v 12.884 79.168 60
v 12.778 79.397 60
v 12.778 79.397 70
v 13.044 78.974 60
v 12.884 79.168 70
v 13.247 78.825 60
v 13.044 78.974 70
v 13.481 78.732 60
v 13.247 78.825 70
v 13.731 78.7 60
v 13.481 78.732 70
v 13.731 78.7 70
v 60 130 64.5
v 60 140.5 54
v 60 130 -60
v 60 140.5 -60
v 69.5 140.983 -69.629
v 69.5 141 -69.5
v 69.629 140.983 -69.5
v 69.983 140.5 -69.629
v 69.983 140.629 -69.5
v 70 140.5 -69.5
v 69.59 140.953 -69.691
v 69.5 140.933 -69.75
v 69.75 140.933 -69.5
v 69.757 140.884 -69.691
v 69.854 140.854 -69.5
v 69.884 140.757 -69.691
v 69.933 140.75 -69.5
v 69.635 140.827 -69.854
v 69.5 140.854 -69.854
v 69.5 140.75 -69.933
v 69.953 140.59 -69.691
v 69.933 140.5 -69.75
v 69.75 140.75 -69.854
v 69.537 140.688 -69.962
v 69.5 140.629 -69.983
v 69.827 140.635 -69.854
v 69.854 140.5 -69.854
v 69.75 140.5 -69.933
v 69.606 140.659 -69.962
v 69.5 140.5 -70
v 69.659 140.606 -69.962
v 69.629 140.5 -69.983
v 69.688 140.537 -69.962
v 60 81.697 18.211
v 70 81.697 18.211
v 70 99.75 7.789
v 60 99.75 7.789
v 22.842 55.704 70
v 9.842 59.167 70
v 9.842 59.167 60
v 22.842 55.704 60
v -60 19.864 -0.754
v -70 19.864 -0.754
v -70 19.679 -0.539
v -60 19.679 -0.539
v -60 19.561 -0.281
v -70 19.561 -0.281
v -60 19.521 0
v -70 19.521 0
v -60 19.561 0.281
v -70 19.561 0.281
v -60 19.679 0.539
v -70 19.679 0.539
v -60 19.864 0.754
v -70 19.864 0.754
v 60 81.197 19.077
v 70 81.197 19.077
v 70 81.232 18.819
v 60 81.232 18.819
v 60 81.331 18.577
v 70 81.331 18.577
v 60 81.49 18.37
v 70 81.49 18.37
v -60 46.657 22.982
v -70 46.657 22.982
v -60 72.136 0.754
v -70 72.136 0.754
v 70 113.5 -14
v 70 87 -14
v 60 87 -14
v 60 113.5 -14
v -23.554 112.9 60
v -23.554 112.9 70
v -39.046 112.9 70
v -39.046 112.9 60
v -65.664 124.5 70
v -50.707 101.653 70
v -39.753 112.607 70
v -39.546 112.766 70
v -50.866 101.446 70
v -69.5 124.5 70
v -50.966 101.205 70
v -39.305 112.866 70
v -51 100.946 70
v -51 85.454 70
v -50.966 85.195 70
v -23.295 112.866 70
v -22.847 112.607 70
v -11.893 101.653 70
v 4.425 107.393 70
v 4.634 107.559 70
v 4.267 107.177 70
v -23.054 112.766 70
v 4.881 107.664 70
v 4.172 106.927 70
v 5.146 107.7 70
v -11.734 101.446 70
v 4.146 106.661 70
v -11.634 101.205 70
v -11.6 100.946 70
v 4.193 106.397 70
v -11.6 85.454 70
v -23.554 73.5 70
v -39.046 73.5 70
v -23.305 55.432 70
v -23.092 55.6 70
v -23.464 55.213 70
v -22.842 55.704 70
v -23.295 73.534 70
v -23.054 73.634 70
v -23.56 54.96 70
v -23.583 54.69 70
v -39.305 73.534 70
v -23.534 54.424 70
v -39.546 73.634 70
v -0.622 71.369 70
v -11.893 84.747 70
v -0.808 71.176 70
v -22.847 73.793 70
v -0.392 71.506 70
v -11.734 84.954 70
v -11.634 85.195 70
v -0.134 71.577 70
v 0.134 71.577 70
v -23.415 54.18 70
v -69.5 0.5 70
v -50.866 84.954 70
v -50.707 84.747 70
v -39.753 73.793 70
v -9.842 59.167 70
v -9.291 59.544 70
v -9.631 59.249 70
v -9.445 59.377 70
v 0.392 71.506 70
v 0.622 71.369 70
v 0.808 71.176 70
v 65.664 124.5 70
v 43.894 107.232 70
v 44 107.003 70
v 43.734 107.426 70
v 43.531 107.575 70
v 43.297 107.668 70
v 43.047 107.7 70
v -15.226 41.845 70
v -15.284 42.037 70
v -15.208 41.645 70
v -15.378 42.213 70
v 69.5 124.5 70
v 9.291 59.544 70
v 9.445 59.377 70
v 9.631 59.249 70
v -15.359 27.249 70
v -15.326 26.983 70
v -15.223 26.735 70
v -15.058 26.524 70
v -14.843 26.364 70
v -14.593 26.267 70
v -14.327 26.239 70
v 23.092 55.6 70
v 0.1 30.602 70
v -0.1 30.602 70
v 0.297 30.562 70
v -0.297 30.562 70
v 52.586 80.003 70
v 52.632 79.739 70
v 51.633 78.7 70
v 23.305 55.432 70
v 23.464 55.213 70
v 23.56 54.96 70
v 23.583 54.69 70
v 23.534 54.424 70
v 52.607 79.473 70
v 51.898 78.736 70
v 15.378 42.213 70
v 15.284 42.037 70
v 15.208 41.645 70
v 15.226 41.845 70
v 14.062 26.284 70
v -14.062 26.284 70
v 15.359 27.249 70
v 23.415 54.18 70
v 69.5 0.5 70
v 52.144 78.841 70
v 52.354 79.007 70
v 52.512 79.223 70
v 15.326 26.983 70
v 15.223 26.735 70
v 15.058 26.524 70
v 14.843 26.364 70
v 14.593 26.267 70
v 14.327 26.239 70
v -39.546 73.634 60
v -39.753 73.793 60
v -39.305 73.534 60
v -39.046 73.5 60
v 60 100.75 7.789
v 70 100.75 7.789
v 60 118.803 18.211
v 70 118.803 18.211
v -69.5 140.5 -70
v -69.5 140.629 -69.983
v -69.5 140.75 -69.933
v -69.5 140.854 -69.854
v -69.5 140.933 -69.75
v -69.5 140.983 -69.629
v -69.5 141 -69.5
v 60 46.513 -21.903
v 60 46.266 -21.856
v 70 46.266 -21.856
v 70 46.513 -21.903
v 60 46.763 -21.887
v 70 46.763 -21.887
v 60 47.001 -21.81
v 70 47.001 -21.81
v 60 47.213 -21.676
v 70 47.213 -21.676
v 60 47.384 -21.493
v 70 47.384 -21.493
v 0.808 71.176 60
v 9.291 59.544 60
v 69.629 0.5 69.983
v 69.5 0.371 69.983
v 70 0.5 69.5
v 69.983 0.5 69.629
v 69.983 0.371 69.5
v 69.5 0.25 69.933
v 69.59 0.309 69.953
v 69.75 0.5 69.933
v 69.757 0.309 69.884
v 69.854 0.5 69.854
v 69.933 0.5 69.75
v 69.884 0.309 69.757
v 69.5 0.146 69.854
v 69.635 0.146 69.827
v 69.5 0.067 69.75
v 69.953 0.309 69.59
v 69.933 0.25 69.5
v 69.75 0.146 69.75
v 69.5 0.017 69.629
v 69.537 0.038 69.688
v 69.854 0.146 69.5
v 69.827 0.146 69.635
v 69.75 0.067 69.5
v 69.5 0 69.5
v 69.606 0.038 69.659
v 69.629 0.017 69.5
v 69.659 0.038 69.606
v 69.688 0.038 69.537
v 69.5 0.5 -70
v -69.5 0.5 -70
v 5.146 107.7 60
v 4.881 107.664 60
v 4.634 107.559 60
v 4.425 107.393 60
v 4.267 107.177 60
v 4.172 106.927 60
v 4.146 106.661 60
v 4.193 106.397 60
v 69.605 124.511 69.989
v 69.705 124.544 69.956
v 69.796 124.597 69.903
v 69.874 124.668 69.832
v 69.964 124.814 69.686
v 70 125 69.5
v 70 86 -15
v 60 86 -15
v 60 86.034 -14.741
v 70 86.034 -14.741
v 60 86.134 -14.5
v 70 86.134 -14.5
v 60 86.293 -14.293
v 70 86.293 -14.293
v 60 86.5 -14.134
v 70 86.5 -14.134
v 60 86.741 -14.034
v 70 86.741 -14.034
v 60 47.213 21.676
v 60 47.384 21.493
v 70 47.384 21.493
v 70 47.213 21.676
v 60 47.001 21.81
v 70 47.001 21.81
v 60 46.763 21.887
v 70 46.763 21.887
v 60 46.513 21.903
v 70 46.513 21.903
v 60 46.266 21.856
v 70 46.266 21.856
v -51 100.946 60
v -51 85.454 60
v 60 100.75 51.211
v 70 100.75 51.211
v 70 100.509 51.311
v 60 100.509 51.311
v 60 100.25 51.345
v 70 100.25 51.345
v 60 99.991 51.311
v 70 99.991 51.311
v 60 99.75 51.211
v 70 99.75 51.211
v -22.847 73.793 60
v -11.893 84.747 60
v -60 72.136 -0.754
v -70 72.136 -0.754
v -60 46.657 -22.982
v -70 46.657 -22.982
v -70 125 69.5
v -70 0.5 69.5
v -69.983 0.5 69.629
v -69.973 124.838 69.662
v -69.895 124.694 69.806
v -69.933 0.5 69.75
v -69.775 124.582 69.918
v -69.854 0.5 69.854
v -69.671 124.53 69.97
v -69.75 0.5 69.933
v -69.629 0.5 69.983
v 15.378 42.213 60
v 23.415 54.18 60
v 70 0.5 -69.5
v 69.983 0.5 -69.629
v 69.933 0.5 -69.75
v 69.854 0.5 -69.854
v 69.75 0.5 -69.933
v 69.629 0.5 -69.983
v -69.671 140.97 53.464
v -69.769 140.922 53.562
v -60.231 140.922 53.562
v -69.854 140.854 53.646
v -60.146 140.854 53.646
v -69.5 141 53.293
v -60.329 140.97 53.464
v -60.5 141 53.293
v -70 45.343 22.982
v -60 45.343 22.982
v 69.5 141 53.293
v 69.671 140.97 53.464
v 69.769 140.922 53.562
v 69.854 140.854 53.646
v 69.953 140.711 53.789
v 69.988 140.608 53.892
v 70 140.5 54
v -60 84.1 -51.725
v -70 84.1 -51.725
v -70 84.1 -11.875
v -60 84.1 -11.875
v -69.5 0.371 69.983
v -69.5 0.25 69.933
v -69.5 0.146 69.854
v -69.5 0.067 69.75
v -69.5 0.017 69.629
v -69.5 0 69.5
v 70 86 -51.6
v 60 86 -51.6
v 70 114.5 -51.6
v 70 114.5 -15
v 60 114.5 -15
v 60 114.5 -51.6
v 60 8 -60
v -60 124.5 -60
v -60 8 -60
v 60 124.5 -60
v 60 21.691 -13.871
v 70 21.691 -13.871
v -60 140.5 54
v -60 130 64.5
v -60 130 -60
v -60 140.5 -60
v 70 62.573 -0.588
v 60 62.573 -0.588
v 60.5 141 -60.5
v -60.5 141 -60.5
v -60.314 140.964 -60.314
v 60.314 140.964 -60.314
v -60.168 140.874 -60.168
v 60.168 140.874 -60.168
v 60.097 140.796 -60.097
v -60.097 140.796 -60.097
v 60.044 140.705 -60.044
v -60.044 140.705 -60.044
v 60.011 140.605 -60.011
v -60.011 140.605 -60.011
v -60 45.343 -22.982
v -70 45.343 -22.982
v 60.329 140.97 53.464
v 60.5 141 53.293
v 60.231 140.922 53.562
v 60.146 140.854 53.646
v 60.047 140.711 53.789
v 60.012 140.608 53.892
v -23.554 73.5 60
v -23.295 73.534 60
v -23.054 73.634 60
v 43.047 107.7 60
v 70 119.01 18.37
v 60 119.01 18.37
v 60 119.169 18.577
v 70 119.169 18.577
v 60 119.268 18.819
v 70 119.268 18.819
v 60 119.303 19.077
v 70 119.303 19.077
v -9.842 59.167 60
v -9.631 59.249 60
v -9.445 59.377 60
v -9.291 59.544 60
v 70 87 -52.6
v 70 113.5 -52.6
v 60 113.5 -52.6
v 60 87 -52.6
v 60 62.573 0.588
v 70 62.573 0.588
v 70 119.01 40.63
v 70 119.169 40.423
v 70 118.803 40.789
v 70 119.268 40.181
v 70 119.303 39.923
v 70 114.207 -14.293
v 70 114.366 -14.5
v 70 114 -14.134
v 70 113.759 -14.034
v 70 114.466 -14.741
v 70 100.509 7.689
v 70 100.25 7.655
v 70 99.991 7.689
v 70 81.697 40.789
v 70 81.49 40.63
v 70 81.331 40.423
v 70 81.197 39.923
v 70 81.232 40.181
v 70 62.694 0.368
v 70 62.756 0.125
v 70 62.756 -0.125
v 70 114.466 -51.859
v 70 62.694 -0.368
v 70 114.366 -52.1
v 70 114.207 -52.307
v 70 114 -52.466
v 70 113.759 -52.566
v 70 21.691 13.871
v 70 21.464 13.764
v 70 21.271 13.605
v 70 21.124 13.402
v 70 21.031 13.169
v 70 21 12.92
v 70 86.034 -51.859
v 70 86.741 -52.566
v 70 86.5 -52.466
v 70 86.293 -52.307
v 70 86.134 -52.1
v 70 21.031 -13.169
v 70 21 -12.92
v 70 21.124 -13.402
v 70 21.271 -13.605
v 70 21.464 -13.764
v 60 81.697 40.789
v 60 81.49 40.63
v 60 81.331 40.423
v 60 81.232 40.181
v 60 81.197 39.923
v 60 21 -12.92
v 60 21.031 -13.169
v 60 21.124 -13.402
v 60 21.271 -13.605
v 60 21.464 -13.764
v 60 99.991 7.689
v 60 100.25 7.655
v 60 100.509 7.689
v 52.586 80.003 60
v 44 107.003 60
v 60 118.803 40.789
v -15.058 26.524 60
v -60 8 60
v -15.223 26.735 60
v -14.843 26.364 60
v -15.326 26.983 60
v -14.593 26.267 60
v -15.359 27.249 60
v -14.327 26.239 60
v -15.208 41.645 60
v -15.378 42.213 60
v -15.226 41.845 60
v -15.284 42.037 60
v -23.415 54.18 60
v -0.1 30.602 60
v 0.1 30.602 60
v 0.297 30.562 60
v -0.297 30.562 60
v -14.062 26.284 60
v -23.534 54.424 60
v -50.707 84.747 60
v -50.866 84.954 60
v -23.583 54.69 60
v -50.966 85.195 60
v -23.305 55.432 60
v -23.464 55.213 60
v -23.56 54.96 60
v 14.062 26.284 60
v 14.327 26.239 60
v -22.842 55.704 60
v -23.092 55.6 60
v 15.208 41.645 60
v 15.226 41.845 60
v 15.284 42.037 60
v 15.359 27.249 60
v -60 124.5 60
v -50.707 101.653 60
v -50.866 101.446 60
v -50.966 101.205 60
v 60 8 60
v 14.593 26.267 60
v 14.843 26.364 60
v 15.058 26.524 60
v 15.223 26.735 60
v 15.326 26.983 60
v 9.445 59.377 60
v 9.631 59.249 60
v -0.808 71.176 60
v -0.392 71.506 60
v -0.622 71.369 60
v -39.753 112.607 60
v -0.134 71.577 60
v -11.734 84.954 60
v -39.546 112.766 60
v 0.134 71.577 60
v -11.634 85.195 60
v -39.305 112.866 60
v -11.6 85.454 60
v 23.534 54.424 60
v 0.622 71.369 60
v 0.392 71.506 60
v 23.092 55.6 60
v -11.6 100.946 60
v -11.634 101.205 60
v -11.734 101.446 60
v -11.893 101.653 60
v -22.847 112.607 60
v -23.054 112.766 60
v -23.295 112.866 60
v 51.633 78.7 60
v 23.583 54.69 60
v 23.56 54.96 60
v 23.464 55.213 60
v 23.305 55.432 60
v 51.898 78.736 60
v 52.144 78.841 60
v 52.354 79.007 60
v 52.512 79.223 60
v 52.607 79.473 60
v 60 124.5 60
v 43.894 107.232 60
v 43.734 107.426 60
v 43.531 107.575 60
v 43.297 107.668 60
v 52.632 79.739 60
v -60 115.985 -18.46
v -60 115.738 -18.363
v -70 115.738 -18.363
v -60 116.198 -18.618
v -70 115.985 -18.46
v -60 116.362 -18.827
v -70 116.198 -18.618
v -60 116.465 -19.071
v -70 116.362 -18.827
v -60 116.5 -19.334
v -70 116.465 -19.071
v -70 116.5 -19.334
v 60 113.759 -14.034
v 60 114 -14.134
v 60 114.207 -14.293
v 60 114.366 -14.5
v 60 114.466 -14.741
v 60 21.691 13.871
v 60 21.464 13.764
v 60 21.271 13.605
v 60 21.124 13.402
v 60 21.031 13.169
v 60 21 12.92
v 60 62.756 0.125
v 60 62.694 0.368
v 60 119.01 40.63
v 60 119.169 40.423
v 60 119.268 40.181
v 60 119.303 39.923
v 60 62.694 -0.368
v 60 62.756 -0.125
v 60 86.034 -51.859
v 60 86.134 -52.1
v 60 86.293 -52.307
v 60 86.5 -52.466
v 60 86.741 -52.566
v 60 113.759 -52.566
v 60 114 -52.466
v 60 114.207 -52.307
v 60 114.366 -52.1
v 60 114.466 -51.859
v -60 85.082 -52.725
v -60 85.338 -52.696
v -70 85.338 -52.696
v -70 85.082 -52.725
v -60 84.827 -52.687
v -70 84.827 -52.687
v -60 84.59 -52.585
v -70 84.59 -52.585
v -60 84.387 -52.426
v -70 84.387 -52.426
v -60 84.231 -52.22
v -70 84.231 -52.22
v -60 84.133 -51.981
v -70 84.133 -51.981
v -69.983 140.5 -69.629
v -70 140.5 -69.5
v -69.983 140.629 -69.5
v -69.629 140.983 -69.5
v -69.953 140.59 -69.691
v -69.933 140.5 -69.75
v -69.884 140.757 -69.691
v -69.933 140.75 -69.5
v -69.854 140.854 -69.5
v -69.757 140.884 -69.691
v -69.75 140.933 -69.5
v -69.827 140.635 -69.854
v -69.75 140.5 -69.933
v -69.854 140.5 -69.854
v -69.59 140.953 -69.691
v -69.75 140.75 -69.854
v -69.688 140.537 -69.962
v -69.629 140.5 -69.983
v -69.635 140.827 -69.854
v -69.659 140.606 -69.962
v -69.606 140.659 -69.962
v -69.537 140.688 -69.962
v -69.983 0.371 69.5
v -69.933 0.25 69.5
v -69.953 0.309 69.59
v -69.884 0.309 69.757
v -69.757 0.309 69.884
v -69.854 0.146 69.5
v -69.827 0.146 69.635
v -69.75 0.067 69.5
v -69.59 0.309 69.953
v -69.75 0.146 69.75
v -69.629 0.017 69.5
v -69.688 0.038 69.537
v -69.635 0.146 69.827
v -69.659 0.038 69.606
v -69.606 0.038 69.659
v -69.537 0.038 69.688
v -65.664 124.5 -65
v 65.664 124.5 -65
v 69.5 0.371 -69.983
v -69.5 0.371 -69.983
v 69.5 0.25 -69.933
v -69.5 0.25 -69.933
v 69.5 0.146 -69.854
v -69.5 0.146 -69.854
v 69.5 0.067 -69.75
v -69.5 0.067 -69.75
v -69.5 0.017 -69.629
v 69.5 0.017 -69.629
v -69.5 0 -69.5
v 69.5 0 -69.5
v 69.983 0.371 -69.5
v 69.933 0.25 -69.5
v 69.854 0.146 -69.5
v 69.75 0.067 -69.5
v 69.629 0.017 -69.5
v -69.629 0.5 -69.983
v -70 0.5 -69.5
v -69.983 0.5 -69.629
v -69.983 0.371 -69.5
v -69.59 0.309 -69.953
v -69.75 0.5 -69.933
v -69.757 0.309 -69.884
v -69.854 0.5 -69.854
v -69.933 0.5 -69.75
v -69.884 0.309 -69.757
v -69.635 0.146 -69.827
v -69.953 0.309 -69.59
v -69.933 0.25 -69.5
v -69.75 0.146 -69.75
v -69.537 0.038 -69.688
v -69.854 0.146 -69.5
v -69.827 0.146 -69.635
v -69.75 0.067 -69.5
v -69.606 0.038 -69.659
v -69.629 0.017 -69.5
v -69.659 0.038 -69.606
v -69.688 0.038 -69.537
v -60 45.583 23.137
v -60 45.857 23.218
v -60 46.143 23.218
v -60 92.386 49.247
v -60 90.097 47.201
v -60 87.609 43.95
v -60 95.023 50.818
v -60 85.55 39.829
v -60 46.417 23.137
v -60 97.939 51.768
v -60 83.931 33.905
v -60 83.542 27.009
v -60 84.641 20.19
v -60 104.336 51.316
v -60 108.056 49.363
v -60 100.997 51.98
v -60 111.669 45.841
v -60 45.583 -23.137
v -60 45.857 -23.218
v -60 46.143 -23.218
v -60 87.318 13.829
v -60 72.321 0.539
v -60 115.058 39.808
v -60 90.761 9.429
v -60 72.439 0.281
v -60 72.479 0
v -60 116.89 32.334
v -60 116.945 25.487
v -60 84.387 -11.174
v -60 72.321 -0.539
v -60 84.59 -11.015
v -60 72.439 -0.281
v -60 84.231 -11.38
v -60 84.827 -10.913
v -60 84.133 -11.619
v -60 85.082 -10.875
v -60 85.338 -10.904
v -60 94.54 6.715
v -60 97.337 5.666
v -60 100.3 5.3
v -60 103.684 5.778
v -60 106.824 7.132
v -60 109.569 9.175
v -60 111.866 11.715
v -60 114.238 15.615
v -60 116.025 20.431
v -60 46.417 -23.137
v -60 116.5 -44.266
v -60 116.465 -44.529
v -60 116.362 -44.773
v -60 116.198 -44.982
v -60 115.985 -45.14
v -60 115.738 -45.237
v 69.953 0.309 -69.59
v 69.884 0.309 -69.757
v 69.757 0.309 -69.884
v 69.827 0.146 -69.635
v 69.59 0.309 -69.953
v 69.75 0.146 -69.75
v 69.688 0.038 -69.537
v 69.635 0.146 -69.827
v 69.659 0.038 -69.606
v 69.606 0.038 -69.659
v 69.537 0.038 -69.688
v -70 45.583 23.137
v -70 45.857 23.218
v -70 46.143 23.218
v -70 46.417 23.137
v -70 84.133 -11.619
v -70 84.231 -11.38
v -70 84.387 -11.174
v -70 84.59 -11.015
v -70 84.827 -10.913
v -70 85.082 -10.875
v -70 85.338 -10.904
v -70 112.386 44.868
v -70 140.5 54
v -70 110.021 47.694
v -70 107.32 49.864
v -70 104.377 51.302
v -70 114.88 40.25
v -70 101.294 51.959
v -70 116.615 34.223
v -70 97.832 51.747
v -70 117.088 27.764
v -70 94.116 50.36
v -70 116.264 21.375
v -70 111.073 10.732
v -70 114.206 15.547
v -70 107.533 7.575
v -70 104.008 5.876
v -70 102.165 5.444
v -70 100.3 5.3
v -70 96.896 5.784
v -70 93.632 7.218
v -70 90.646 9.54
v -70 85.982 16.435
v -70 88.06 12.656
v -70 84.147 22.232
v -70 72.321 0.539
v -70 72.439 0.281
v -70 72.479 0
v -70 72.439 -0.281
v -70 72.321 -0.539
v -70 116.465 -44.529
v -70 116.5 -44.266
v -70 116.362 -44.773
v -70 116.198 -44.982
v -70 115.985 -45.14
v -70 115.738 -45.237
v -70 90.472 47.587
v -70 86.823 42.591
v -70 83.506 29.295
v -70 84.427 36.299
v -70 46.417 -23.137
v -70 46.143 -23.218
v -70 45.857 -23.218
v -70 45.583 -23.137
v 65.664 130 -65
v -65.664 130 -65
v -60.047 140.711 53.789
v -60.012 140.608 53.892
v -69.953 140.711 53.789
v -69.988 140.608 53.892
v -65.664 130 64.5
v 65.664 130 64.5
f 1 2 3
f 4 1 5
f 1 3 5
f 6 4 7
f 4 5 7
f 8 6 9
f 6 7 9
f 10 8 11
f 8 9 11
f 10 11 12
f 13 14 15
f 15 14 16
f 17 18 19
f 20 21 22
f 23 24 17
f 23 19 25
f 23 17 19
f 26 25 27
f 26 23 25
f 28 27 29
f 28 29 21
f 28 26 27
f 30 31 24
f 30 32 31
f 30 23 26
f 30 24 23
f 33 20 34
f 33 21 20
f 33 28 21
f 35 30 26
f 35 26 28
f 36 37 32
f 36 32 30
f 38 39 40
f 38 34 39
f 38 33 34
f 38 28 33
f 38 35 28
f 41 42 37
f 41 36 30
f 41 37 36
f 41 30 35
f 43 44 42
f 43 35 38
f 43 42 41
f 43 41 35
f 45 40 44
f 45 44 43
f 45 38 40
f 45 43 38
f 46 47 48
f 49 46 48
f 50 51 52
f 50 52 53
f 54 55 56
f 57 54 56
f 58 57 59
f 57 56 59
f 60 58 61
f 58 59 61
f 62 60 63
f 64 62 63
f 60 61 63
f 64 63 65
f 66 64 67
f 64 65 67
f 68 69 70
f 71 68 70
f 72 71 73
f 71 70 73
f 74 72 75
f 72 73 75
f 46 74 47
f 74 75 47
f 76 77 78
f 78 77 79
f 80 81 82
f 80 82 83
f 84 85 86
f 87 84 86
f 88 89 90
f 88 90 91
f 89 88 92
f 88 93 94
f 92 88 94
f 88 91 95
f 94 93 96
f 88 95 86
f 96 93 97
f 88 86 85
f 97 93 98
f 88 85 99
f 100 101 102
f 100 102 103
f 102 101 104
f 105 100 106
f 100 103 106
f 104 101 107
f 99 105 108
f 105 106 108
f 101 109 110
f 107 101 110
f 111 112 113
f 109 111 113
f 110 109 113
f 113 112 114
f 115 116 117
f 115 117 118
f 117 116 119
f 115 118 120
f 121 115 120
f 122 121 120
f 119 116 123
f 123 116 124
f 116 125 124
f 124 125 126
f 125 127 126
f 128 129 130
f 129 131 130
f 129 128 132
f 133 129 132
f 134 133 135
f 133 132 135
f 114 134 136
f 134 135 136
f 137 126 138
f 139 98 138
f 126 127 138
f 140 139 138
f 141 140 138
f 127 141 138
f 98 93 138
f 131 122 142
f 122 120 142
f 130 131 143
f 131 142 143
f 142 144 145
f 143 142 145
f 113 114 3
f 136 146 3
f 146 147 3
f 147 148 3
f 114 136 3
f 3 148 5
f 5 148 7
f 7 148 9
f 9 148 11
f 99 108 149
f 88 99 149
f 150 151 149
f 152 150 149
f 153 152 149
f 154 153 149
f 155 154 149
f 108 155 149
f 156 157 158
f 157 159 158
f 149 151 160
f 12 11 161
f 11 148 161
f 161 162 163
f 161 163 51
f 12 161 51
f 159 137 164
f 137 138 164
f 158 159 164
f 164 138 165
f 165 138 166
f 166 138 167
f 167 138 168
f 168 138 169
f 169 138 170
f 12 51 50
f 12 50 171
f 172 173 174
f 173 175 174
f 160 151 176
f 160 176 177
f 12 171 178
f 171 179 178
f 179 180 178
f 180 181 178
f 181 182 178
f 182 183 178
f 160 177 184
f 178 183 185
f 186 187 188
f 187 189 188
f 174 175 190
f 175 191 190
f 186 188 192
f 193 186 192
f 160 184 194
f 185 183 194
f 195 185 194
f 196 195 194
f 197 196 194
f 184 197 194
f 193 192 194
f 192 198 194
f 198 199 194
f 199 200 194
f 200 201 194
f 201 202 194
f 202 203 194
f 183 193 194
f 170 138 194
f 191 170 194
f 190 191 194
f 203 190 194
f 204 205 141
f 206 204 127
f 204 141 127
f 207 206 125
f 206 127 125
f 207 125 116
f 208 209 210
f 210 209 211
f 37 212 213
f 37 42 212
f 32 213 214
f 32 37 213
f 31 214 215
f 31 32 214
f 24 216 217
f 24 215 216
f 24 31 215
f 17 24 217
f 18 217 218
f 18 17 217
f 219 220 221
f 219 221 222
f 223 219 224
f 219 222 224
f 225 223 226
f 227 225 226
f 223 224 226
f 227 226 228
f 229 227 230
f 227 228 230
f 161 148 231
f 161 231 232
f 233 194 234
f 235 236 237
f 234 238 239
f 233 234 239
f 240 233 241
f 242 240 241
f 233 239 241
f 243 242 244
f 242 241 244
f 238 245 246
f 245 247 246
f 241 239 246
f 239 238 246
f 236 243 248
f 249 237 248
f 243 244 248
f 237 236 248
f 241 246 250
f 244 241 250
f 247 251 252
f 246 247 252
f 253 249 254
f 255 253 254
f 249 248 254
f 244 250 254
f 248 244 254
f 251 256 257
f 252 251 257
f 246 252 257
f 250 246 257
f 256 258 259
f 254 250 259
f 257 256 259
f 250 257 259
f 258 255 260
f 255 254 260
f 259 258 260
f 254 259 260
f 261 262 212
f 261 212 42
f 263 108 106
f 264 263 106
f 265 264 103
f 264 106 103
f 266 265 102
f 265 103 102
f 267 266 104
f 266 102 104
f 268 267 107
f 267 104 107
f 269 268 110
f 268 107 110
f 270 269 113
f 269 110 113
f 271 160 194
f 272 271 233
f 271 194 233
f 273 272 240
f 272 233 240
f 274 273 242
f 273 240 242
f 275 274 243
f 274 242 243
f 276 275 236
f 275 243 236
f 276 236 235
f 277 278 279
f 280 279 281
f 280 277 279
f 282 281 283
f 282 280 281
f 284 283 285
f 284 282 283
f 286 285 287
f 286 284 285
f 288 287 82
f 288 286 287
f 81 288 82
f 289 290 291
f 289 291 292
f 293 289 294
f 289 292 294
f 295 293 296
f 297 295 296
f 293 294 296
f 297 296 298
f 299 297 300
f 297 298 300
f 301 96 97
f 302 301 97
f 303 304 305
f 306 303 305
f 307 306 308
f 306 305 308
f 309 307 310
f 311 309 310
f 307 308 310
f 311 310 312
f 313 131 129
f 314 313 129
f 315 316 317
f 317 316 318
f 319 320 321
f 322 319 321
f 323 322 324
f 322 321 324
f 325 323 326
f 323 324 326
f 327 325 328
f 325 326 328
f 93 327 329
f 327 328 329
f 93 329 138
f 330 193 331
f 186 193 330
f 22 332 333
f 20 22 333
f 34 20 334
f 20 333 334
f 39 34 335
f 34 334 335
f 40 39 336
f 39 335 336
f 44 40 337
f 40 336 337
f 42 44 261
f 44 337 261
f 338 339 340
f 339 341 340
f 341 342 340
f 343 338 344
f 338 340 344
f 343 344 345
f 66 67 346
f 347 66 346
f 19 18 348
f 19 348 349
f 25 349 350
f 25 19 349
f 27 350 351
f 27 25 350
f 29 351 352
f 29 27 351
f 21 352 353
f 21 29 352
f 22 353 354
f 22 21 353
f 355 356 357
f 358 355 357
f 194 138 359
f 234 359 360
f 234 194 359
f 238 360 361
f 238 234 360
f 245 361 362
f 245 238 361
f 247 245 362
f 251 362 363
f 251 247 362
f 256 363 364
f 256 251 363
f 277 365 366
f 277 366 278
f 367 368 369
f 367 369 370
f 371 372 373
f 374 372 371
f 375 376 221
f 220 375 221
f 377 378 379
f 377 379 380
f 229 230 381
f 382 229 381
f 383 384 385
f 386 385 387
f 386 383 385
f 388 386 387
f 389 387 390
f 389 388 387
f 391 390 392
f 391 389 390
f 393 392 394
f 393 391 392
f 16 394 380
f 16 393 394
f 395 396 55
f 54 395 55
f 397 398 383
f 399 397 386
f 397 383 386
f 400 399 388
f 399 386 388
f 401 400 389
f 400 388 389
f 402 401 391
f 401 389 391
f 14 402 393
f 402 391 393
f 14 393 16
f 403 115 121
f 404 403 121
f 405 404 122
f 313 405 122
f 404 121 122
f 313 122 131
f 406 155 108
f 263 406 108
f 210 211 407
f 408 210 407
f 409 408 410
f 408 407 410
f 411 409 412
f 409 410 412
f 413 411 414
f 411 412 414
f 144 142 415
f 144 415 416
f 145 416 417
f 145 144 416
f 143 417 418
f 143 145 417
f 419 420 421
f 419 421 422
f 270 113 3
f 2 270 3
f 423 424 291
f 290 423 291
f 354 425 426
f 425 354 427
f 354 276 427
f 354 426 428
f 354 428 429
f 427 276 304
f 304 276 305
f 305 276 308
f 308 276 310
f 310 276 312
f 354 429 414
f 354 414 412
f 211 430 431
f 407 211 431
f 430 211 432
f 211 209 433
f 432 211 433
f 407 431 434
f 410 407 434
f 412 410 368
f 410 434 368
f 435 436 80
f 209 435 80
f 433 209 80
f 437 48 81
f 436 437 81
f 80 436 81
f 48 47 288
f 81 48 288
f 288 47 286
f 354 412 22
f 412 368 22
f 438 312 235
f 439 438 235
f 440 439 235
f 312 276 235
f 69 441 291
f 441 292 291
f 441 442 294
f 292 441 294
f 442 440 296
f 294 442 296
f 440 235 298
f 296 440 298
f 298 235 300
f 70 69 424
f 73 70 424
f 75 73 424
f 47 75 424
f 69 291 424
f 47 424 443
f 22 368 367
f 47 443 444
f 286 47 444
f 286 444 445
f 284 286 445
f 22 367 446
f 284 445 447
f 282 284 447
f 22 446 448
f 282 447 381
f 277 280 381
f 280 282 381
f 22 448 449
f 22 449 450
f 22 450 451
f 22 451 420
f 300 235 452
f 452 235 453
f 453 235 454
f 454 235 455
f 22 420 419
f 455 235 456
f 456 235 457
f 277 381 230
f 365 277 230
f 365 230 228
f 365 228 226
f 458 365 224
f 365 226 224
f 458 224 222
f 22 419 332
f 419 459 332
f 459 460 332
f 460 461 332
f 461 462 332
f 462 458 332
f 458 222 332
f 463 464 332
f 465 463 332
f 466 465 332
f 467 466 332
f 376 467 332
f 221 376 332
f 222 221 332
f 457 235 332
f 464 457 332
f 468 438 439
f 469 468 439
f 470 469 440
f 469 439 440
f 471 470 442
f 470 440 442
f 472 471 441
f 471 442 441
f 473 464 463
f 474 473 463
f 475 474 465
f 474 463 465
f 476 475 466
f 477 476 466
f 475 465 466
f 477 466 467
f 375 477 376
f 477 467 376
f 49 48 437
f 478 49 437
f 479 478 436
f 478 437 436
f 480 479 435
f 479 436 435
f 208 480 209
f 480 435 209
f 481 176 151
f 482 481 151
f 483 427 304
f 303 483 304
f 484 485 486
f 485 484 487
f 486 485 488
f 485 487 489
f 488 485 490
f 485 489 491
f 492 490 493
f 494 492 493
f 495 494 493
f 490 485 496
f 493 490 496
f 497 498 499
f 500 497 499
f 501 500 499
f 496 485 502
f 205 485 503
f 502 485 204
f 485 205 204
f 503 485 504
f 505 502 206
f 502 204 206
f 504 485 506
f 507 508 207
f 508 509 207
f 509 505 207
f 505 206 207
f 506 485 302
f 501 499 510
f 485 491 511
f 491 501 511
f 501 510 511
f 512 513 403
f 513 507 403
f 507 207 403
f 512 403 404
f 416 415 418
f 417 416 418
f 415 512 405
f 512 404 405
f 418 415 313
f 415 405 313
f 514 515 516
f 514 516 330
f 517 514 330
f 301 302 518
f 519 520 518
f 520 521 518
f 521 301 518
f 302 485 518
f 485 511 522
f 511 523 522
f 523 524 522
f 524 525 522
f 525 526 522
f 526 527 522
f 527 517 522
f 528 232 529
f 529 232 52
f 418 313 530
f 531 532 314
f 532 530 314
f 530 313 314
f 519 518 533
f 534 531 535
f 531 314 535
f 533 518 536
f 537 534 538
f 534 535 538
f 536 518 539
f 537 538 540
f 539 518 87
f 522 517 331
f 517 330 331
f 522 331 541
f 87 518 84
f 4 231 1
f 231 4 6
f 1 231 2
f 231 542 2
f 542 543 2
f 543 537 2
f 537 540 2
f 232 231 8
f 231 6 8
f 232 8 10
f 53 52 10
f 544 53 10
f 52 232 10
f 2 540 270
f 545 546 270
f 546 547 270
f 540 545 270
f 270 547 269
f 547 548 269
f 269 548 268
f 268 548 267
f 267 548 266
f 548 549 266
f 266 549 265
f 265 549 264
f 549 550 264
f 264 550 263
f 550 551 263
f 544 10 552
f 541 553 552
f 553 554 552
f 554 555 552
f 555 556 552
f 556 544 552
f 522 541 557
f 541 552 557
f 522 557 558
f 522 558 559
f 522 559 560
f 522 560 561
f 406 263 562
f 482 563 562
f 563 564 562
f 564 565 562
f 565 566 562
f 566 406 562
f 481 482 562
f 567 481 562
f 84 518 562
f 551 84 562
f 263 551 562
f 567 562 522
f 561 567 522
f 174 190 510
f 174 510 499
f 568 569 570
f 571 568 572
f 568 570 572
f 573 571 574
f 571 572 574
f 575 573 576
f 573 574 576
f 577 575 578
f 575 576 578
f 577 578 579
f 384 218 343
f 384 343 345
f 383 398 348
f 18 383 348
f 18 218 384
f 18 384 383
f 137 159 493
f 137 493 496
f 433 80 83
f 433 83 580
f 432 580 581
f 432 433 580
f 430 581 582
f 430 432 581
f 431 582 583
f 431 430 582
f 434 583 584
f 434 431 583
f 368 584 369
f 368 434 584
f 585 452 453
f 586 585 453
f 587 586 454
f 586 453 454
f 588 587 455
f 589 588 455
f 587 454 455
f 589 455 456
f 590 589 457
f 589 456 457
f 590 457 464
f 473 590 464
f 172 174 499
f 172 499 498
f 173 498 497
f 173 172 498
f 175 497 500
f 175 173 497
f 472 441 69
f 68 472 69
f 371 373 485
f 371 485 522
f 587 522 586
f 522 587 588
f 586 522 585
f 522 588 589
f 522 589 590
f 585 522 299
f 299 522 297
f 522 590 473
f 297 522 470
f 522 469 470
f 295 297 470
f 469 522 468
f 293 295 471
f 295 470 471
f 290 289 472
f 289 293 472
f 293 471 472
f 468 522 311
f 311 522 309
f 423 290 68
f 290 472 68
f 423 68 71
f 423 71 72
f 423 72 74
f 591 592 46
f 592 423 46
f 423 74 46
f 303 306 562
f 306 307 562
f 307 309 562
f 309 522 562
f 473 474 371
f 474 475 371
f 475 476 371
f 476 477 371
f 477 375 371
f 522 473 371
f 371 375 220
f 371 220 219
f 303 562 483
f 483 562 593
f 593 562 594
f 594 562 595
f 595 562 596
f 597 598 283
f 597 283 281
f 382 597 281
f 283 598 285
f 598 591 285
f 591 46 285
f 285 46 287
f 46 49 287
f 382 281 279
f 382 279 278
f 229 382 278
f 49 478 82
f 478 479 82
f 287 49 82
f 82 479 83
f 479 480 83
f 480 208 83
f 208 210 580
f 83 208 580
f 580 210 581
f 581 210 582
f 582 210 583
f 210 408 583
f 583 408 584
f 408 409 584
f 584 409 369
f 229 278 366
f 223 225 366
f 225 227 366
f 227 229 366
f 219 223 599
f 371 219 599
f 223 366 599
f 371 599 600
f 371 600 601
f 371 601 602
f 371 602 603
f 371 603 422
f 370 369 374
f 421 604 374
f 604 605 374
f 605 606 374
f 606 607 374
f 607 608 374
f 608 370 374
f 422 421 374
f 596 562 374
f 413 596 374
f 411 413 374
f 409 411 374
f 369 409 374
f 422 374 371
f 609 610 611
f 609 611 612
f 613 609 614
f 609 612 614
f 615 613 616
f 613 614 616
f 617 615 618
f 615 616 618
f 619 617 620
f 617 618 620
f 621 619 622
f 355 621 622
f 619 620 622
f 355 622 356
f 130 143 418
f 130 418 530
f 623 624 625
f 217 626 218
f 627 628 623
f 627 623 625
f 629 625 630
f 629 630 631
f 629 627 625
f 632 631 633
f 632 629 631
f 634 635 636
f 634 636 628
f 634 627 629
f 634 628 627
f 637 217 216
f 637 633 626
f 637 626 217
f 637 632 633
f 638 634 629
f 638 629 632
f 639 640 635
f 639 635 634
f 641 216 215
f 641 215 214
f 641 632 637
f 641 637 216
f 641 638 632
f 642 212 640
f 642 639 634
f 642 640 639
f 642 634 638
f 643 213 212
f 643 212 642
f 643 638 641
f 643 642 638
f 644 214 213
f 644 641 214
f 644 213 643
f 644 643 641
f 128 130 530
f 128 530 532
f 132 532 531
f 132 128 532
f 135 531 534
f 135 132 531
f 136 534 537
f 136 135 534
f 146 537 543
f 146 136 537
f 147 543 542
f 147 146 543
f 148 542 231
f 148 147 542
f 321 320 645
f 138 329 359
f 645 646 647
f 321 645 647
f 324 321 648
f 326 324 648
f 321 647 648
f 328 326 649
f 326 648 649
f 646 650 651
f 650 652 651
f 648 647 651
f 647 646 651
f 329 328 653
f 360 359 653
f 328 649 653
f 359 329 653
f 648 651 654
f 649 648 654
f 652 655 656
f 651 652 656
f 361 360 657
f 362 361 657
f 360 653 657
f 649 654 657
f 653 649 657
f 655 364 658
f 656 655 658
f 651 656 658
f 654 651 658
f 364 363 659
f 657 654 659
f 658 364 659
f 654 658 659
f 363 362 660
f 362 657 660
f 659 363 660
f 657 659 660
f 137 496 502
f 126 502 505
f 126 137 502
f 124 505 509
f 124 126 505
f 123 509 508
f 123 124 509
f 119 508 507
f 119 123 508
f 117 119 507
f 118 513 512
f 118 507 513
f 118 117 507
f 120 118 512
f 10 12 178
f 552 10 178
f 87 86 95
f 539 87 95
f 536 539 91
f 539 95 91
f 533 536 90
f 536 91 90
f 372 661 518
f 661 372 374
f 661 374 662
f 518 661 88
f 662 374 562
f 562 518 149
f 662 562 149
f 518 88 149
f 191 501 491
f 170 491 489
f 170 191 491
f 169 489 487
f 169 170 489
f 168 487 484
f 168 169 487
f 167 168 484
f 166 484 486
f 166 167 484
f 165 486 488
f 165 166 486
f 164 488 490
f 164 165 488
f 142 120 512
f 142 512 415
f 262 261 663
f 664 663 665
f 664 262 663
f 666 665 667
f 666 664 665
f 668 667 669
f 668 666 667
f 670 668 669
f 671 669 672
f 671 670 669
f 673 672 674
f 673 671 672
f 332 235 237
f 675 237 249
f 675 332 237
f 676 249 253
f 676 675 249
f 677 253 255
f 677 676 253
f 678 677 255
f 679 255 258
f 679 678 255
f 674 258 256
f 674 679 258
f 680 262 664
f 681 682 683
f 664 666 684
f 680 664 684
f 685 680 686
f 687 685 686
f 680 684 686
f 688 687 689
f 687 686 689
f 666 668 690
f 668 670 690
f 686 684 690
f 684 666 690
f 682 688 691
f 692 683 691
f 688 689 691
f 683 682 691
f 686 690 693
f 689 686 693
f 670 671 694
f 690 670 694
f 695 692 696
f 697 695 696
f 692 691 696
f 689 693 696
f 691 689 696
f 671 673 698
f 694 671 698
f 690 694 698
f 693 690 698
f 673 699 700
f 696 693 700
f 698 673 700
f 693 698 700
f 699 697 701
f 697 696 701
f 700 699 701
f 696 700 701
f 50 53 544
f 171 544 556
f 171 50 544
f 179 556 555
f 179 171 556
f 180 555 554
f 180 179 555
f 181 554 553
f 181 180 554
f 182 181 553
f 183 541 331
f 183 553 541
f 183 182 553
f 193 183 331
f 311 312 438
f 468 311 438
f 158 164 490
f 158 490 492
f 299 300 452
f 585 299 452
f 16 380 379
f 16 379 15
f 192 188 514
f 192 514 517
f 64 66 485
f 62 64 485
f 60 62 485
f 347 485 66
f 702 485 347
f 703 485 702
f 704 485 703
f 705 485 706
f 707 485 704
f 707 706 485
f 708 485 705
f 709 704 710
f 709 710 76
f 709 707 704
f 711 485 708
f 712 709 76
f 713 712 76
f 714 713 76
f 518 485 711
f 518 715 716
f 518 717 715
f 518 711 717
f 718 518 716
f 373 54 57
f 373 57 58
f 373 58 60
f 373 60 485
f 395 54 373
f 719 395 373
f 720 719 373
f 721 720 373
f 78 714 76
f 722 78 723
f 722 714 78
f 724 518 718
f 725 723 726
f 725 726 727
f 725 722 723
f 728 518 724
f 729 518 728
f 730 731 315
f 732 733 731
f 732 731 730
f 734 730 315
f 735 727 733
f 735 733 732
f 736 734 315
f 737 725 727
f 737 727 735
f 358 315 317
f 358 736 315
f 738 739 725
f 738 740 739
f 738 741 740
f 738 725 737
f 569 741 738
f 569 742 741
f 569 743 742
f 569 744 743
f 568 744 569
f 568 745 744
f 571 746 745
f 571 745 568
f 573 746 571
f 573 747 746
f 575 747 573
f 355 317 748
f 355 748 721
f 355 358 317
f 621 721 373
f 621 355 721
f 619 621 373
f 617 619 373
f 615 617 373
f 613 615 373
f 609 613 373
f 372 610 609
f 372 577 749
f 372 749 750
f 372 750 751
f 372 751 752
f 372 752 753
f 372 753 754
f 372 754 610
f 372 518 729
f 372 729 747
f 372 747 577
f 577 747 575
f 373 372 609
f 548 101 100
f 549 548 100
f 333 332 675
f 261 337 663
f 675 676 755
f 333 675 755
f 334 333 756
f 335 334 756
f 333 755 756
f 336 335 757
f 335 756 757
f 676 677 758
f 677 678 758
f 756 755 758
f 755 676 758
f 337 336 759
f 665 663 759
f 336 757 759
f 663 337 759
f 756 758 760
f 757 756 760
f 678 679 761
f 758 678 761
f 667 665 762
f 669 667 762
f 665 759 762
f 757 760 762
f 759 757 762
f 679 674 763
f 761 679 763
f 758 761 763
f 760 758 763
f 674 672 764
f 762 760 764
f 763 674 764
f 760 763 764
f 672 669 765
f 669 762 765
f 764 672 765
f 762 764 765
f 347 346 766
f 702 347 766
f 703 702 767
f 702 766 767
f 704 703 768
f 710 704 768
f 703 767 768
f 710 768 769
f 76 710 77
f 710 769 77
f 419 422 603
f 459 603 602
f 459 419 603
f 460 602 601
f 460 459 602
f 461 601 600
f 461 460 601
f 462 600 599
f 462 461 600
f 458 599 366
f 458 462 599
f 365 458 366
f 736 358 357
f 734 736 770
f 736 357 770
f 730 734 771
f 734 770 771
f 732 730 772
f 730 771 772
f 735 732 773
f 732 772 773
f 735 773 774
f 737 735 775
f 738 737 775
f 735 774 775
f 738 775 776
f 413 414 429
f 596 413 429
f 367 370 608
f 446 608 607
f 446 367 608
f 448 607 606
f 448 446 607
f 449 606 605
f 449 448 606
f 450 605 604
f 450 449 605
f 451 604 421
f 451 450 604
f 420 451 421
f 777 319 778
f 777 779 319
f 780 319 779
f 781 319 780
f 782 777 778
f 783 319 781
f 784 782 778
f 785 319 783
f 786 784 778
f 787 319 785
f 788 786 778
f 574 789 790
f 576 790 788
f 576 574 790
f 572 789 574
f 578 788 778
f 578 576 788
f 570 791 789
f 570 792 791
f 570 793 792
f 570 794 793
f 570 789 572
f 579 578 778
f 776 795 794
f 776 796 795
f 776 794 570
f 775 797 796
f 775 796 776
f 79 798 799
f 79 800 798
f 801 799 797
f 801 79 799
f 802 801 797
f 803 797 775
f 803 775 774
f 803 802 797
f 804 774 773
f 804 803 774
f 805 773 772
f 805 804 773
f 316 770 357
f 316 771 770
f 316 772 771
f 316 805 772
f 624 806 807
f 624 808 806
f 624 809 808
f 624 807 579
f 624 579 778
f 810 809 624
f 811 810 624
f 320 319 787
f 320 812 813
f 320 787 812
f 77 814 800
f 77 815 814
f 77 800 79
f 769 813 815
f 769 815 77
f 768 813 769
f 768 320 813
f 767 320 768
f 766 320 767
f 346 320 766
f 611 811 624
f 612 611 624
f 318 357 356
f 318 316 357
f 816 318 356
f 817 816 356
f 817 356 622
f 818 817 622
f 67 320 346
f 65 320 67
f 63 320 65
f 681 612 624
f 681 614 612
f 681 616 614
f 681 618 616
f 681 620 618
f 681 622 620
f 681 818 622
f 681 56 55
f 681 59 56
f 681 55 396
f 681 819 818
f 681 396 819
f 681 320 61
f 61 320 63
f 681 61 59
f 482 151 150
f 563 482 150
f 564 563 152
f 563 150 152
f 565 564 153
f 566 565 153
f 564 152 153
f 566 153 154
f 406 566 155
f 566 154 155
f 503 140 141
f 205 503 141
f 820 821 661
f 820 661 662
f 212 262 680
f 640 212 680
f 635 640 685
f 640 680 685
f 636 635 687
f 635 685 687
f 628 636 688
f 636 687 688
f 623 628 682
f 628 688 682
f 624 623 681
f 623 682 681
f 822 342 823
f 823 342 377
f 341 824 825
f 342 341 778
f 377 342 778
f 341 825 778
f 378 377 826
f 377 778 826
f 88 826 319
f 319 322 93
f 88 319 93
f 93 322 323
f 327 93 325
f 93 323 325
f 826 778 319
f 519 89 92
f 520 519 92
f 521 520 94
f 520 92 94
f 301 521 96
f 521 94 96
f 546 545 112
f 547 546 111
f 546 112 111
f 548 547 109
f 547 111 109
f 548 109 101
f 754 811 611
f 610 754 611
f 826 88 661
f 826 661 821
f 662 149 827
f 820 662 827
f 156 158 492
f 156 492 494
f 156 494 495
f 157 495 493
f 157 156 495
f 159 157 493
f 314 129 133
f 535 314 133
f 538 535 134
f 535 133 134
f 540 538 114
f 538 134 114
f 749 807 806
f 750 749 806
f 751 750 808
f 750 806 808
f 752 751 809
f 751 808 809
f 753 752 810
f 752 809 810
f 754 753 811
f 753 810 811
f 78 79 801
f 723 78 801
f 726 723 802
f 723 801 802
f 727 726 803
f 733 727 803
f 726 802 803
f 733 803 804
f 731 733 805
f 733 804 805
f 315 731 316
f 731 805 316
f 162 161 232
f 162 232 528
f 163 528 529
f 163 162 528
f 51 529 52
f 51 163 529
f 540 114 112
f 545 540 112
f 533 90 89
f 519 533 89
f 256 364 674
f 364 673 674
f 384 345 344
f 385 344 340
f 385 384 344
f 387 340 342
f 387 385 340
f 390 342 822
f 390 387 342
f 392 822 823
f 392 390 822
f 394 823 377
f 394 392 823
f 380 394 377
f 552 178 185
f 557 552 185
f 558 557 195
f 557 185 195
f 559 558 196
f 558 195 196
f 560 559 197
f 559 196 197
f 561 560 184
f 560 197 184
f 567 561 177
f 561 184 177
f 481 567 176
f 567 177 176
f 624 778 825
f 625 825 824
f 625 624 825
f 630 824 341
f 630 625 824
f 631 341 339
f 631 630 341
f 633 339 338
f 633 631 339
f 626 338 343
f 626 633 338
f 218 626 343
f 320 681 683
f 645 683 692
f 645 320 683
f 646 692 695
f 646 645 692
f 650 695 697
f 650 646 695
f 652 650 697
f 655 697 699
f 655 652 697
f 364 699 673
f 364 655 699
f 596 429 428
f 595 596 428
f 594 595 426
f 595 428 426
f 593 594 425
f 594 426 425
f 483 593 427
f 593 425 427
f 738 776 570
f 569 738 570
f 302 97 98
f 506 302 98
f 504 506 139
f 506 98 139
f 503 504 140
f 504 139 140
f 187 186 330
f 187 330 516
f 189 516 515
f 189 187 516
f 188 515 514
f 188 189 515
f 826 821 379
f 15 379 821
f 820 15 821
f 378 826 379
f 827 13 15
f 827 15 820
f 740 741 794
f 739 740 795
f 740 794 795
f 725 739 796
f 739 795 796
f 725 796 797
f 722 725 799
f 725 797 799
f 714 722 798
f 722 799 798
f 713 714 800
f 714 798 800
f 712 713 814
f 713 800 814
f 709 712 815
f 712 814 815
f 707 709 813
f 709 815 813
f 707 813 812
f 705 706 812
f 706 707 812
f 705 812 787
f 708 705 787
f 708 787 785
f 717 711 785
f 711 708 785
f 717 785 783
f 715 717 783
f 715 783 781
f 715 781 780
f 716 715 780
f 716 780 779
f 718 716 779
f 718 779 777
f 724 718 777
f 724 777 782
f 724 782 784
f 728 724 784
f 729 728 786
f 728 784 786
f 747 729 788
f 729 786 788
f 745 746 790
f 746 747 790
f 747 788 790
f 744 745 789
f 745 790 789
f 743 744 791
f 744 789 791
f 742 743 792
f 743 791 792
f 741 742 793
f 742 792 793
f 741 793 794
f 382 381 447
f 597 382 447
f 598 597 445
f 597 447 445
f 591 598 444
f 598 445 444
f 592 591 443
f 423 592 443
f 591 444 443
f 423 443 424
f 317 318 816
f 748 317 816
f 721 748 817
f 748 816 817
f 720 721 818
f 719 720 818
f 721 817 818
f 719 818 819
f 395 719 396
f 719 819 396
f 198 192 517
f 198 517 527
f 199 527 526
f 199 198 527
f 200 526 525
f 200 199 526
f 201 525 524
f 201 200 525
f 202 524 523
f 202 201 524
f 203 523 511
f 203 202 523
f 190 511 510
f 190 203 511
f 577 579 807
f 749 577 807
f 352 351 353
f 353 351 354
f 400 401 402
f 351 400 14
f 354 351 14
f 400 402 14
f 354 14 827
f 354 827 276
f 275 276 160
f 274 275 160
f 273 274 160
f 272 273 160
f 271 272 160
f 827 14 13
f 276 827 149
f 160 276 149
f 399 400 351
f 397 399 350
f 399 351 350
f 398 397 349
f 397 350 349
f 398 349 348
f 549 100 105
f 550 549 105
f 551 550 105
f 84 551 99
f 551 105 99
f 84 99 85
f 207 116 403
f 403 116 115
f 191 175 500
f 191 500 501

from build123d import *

# Parameters (mm, degrees)
SKETCH2_W           = 140
SKETCH2_H           = 140
BOSS_EXTRUDE1_DEPTH = 141
SKETCH3_W           = 120
SKETCH3_H           = 120
CUT_EXTRUDE1_DEPTH  = 133
SKETCH4_W           = 131.328549568
SKETCH4_H           = 5.5
CUT_EXTRUDE2_DEPTH  = 135
CUT_EXTRUDE3_DEPTH  = 211.667985228
CUT_EXTRUDE4_REACH  = 212.668
CUT_EXTRUDE5_REACH  = 212.668
SKETCH7_RX          = 23.35
SKETCH7_RY          = 16.8
CUT_EXTRUDE6_REACH  = 212.668
FILLET2_R           = 0.5
FILLET6_R           = 0.5
SKETCH10_W          = 120
SKETCH10_H          = 10.5
CUT_EXTRUDE7_DEPTH  = 131
FILLET7_R           = 0.5


with BuildPart() as part:
    # Sketch2 → Boss-Extrude1 (new body)
    with BuildSketch(Plane(origin=(0, 0, 0), x_dir=(1, 0, 0), z_dir=(0, 1, 0))):
        Rectangle(SKETCH2_W, SKETCH2_H)
    extrude(amount=BOSS_EXTRUDE1_DEPTH)

    # Sketch3 → Cut-Extrude1 (cut)
    with BuildSketch(Plane(origin=(0, 141, 0), x_dir=(1, 0, 0), z_dir=(0, 1, 0))):
        Rectangle(SKETCH3_W, SKETCH3_H)
    extrude(amount=-CUT_EXTRUDE1_DEPTH, mode=Mode.SUBTRACT)

    # Sketch4 → Cut-Extrude2 (cut)
    with BuildSketch(Plane.XY.offset(70)):
        with Locations((0, 127.25)):
            Rectangle(SKETCH4_W, SKETCH4_H)
    extrude(amount=-CUT_EXTRUDE2_DEPTH, mode=Mode.SUBTRACT)

    # Sketch5 → Cut-Extrude3 (cut, through all)
    with BuildSketch(Plane.ZY.offset(70)):
        Polygon((53.5, 141), (70, 124.5), (70, 141), align=None)
    extrude(amount=-CUT_EXTRUDE3_DEPTH, mode=Mode.SUBTRACT)

    # Sketch6 → Cut-Extrude4 (cut, up to next)
    with BuildSketch(Plane.XY.offset(70), mode=Mode.PRIVATE) as cut_extrude4_sk1:
        with BuildLine():
            Line((-11.6, 85.454206384), (-11.6, 100.945793616))
            ThreePointArc((-11.6, 100.945793616), (-11.676120467, 101.328477049), (-11.892893219, 101.652900398))
            Line((-11.892893219, 101.652900398), (-22.847099602, 112.607106781))
            ThreePointArc((-22.847099602, 112.607106781), (-23.171522951, 112.823879533), (-23.554206384, 112.9))
            Line((-23.554206384, 112.9), (-39.045793616, 112.9))
            ThreePointArc((-39.045793616, 112.9), (-39.428477049, 112.823879533), (-39.752900398, 112.607106781))
            Line((-39.752900398, 112.607106781), (-50.707106781, 101.652900398))
            ThreePointArc((-50.707106781, 101.652900398), (-50.923879533, 101.328477049), (-51, 100.945793616))
            Line((-51, 100.945793616), (-51, 85.454206384))
            ThreePointArc((-51, 85.454206384), (-50.923879533, 85.071522951), (-50.707106781, 84.747099602))
            Line((-50.707106781, 84.747099602), (-39.752900398, 73.792893219))
            ThreePointArc((-39.752900398, 73.792893219), (-39.428477049, 73.576120467), (-39.045793616, 73.5))
            Line((-39.045793616, 73.5), (-23.554206384, 73.5))
            ThreePointArc((-23.554206384, 73.5), (-23.171522951, 73.576120467), (-22.847099602, 73.792893219))
            Line((-22.847099602, 73.792893219), (-11.892893219, 84.747099602))
            ThreePointArc((-11.892893219, 84.747099602), (-11.676120467, 85.071522951), (-11.6, 85.454206384))
        make_face()
    cut_extrude4_tool1 = extrude(cut_extrude4_sk1.sketch, amount=-CUT_EXTRUDE4_REACH, mode=Mode.PRIVATE) & part.part
    # Sketch6 → Cut-Extrude4 (cut, up to next)
    with BuildSketch(Plane.XY.offset(70), mode=Mode.PRIVATE) as cut_extrude4_sk2:
        with BuildLine():
            Line((-15.359083662, 27.249175687), (-15.208454306, 41.645423645))
            ThreePointArc((-15.208454306, 41.645423645), (-15.250288115, 41.942281763), (-15.378232008, 42.213400131))
            Line((-15.378232008, 42.213400131), (-23.414818917, 54.180300077))
            ThreePointArc((-23.414818917, 54.180300077), (-23.520704727, 55.089672077), (-22.842019393, 55.704127491))
            Line((-22.842019393, 55.704127491), (-9.842019393, 59.166549034))
            ThreePointArc((-9.842019393, 59.166549034), (-9.53434867, 59.307798129), (-9.291438498, 59.543609979))
            Line((-9.291438498, 59.543609979), (-0.807948934, 71.175679843))
            ThreePointArc((-0.807948934, 71.175679843), (0, 71.586427333), (0.807948934, 71.175679843))
            Line((0.807948934, 71.175679843), (9.291438498, 59.543609979))
            ThreePointArc((9.291438498, 59.543609979), (9.53434867, 59.307798129), (9.842019393, 59.166549034))
            Line((9.842019393, 59.166549034), (22.842019393, 55.704127491))
            ThreePointArc((22.842019393, 55.704127491), (23.520704727, 55.089672077), (23.414818917, 54.180300077))
            Line((23.414818917, 54.180300077), (15.378232008, 42.213400131))
            ThreePointArc((15.378232008, 42.213400131), (15.250288115, 41.942281763), (15.208454306, 41.645423645))
            Line((15.208454306, 41.645423645), (15.359083662, 27.249175687))
            ThreePointArc((15.359083662, 27.249175687), (14.956308766, 26.436598738), (14.062355917, 26.283768052))
            Line((14.062355917, 26.283768052), (0.296782478, 30.561899811))
            ThreePointArc((0.296782478, 30.561899811), (0, 30.606954703), (-0.296782478, 30.561899811))
            Line((-0.296782478, 30.561899811), (-14.062355917, 26.283768052))
            ThreePointArc((-14.062355917, 26.283768052), (-14.956308766, 26.436598738), (-15.359083662, 27.249175687))
        make_face()
    cut_extrude4_tool2 = extrude(cut_extrude4_sk2.sketch, amount=-CUT_EXTRUDE4_REACH, mode=Mode.PRIVATE) & part.part
    # Sketch6 → Cut-Extrude4 (cut, up to next)
    with BuildSketch(Plane.XY.offset(70), mode=Mode.PRIVATE) as cut_extrude4_sk3:
        with BuildLine():
            Line((4.192722534, 106.396964853), (12.778374169, 79.396964853))
            ThreePointArc((12.778374169, 79.396964853), (13.141029549, 78.892833615), (13.73135355, 78.7))
            Line((13.73135355, 78.7), (51.632672255, 78.7))
            ThreePointArc((51.632672255, 78.7), (52.43983864, 79.109675999), (52.585651635, 80.003035147))
            Line((52.585651635, 80.003035147), (44, 107.003035147))
            ThreePointArc((44, 107.003035147), (43.637344621, 107.507166385), (43.04702062, 107.7))
            Line((43.04702062, 107.7), (5.145701914, 107.7))
            ThreePointArc((5.145701914, 107.7), (4.338535529, 107.290324001), (4.192722534, 106.396964853))
        make_face()
    cut_extrude4_tool3 = extrude(cut_extrude4_sk3.sketch, amount=-CUT_EXTRUDE4_REACH, mode=Mode.PRIVATE) & part.part
    add(cut_extrude4_tool1.solids().sort_by_distance((-31.3, 93.2, 70))[0], mode=Mode.SUBTRACT)
    add(cut_extrude4_tool2.solids().sort_by_distance((0, 46.589707, 70))[0], mode=Mode.SUBTRACT)
    add(cut_extrude4_tool3.solids().sort_by_distance((28.389187, 93.2, 70))[0], mode=Mode.SUBTRACT)

    # Sketch7 → Cut-Extrude5 (cut, up to next)
    with BuildSketch(Plane.ZY.offset(70), mode=Mode.PRIVATE) as cut_extrude5_sk1:
        with Locations(Location((28.65, 100.3), (0, 0, 180))):
            Ellipse(SKETCH7_RX, SKETCH7_RY)
    cut_extrude5_tool1 = extrude(cut_extrude5_sk1.sketch, amount=-CUT_EXTRUDE5_REACH, mode=Mode.PRIVATE) & part.part
    # Sketch7 → Cut-Extrude5 (cut, up to next)
    with BuildSketch(Plane.ZY.offset(70), mode=Mode.PRIVATE) as cut_extrude5_sk2:
        with BuildLine():
            Line((-51.724966278, 84.1), (-11.875033722, 84.1))
            ThreePointArc((-11.875033722, 84.1), (-11.088172379, 84.482870171), (-10.903842509, 85.338301548))
            Line((-10.903842509, 85.338301548), (-18.363101769, 115.738301548))
            ThreePointArc((-18.363101769, 115.738301548), (-18.717163152, 116.286861343), (-19.334292982, 116.5))
            Line((-19.334292982, 116.5), (-44.265707018, 116.5))
            ThreePointArc((-44.265707018, 116.5), (-44.882836848, 116.286861343), (-45.236898231, 115.738301548))
            Line((-45.236898231, 115.738301548), (-52.696157491, 85.338301548))
            ThreePointArc((-52.696157491, 85.338301548), (-52.511827621, 84.482870171), (-51.724966278, 84.1))
        make_face()
    cut_extrude5_tool2 = extrude(cut_extrude5_sk2.sketch, amount=-CUT_EXTRUDE5_REACH, mode=Mode.PRIVATE) & part.part
    # Sketch7 → Cut-Extrude5 (cut, up to next)
    with BuildSketch(Plane.ZY.offset(70), mode=Mode.PRIVATE) as cut_extrude5_sk3:
        with BuildLine():
            Line((0.753535335, 19.863719353), (22.982088168, 45.342592593))
            ThreePointArc((22.982088168, 45.342592593), (23.228552834, 46), (22.982088168, 46.657407407))
            Line((22.982088168, 46.657407407), (0.753535335, 72.136280647))
            ThreePointArc((0.753535335, 72.136280647), (0, 72.478873239), (-0.753535335, 72.136280647))
            Line((-0.753535335, 72.136280647), (-22.982088168, 46.657407407))
            ThreePointArc((-22.982088168, 46.657407407), (-23.228552834, 46), (-22.982088168, 45.342592593))
            Line((-22.982088168, 45.342592593), (-0.753535335, 19.863719353))
            ThreePointArc((-0.753535335, 19.863719353), (0, 19.521126761), (0.753535335, 19.863719353))
        make_face()
    cut_extrude5_tool3 = extrude(cut_extrude5_sk3.sketch, amount=-CUT_EXTRUDE5_REACH, mode=Mode.PRIVATE) & part.part
    add(cut_extrude5_tool1.solids().sort_by_distance((-70, 100.3, 28.65))[0], mode=Mode.SUBTRACT)
    add(cut_extrude5_tool2.solids().sort_by_distance((-70, 99.059866, -31.8))[0], mode=Mode.SUBTRACT)
    add(cut_extrude5_tool3.solids().sort_by_distance((-70, 46, 0))[0], mode=Mode.SUBTRACT)

    # Sketch9 → Cut-Extrude6 (cut, up to next)
    with BuildSketch(Plane(origin=(70, 0, 0), x_dir=(0, 0, -1), z_dir=(1, 0, 0)), mode=Mode.PRIVATE) as cut_extrude6_sk1:
        with BuildLine():
            Line((-12.920084714, 21), (12.920084714, 21))
            ThreePointArc((12.920084714, 21), (13.507869966, 21.190983006), (13.87114123, 21.690983006))
            Line((13.87114123, 21.690983006), (21.856192721, 46.266444522))
            ThreePointArc((21.856192721, 46.266444522), (21.856192721, 46.884478511), (21.492921457, 47.384478511))
            Line((21.492921457, 47.384478511), (0.587785252, 62.572949017))
            ThreePointArc((0.587785252, 62.572949017), (0, 62.763932023), (-0.587785252, 62.572949017))
            Line((-0.587785252, 62.572949017), (-21.492921457, 47.384478511))
            ThreePointArc((-21.492921457, 47.384478511), (-21.856192721, 46.884478511), (-21.856192721, 46.266444522))
            Line((-21.856192721, 46.266444522), (-13.87114123, 21.690983006))
            ThreePointArc((-13.87114123, 21.690983006), (-13.507869966, 21.190983006), (-12.920084714, 21))
        make_face()
    cut_extrude6_tool1 = extrude(cut_extrude6_sk1.sketch, amount=-CUT_EXTRUDE6_REACH, mode=Mode.PRIVATE) & part.part
    # Sketch9 → Cut-Extrude6 (cut, up to next)
    with BuildSketch(Plane(origin=(70, 0, 0), x_dir=(0, 0, -1), z_dir=(1, 0, 0)), mode=Mode.PRIVATE) as cut_extrude6_sk2:
        with BuildLine():
            Line((15, 114.5), (51.6, 114.5))
            ThreePointArc((51.6, 114.5), (52.307106781, 114.207106781), (52.6, 113.5))
            Line((52.6, 113.5), (52.6, 87))
            ThreePointArc((52.6, 87), (52.307106781, 86.292893219), (51.6, 86))
            Line((51.6, 86), (15, 86))
            ThreePointArc((15, 86), (14.292893219, 86.292893219), (14, 87))
            Line((14, 87), (14, 113.5))
            ThreePointArc((14, 113.5), (14.292893219, 114.207106781), (15, 114.5))
        make_face()
    cut_extrude6_tool2 = extrude(cut_extrude6_sk2.sketch, amount=-CUT_EXTRUDE6_REACH, mode=Mode.PRIVATE) & part.part
    # Sketch9 → Cut-Extrude6 (cut, up to next)
    with BuildSketch(Plane(origin=(70, 0, 0), x_dir=(0, 0, -1), z_dir=(1, 0, 0)), mode=Mode.PRIVATE) as cut_extrude6_sk3:
        with BuildLine():
            Line((-40.788675135, 118.802558883), (-51.211324865, 100.75))
            ThreePointArc((-51.211324865, 100.75), (-51.345299462, 100.25), (-51.211324865, 99.75))
            Line((-51.211324865, 99.75), (-40.788675135, 81.697441117))
            ThreePointArc((-40.788675135, 81.697441117), (-40.422649731, 81.331415713), (-39.922649731, 81.197441117))
            Line((-39.922649731, 81.197441117), (-19.077350269, 81.197441117))
            ThreePointArc((-19.077350269, 81.197441117), (-18.577350269, 81.331415713), (-18.211324865, 81.697441117))
            Line((-18.211324865, 81.697441117), (-7.788675135, 99.75))
            ThreePointArc((-7.788675135, 99.75), (-7.654700538, 100.25), (-7.788675135, 100.75))
            Line((-7.788675135, 100.75), (-18.211324865, 118.802558883))
            ThreePointArc((-18.211324865, 118.802558883), (-18.577350269, 119.168584287), (-19.077350269, 119.302558883))
            Line((-19.077350269, 119.302558883), (-39.922649731, 119.302558883))
            ThreePointArc((-39.922649731, 119.302558883), (-40.422649731, 119.168584287), (-40.788675135, 118.802558883))
        make_face()
    cut_extrude6_tool3 = extrude(cut_extrude6_sk3.sketch, amount=-CUT_EXTRUDE6_REACH, mode=Mode.PRIVATE) & part.part
    add(cut_extrude6_tool1.solids().sort_by_distance((70, 39.782971, 0))[0], mode=Mode.SUBTRACT)
    add(cut_extrude6_tool2.solids().sort_by_distance((70, 100.25, -33.3))[0], mode=Mode.SUBTRACT)
    add(cut_extrude6_tool3.solids().sort_by_distance((70, 100.25, 29.5))[0], mode=Mode.SUBTRACT)

    # Fillet2
    fillet2_edges = [part.edges().sort_by_distance(p)[0] for p in [
        (0, 141, -70),
        (-60, 141, -3.25),
        (0, 141, -60),
        (-70, 141, -8.25),
        (60, 141, -3.25),
        (70, 141, -8.25),
        (-65, 141, 53.5),
        (65, 141, 53.5),
    ]]
    fillet(fillet2_edges, radius=FILLET2_R)

    # Fillet6
    # the kernel refuses this fillet: 0.5 mm, written as the material it takes off along each edge
    with BuildSketch(Plane(origin=(-69.5, 140.5, -69.5), x_dir=(-1, 0, 0), z_dir=(0, 0, -1))) as fillet6_piece_1_section:
        Polygon((0, 0), (FILLET6_R, 0), (FILLET6_R, FILLET6_R), (0, FILLET6_R), align=None)
    fillet6_piece_1 = extrude(amount=FILLET6_R, mode=Mode.PRIVATE)
    fillet6_piece_1 = fillet6_piece_1 - Plane(origin=(-69.5, 140.5, -69.5), x_dir=(0.7071067811865475, -0.7071067811865475, 0), z_dir=(0, 0, -1)) * Sphere(FILLET6_R, mode=Mode.PRIVATE)
    add(fillet6_piece_1, mode=Mode.SUBTRACT)
    with BuildSketch(Plane(origin=(69.5, 140.5, -69.5), x_dir=(1, 0, 0), z_dir=(0, 0, -1))) as fillet6_piece_2_section:
        Polygon((0, 0), (FILLET6_R, 0), (FILLET6_R, -FILLET6_R), (0, -FILLET6_R), align=None)
    fillet6_piece_2 = extrude(amount=FILLET6_R, mode=Mode.PRIVATE)
    fillet6_piece_2 = fillet6_piece_2 - Plane(origin=(69.5, 140.5, -69.5), x_dir=(-0.7071067811865475, -0.7071067811865475, 0), z_dir=(0, 0, -1)) * Sphere(FILLET6_R, mode=Mode.PRIVATE)
    add(fillet6_piece_2, mode=Mode.SUBTRACT)
    with BuildSketch(Plane(origin=(-70, -1.25, -70), x_dir=(1, 0, 0), z_dir=(0, 1, 0))) as fillet6_piece_3:
        with BuildLine():
            CenterArc((FILLET6_R, -FILLET6_R), FILLET6_R, 90, 90)
            Line((0, -FILLET6_R), (0, 0))
            Line((0, 0), (FILLET6_R, 0))
        make_face()
    extrude(amount=141.75, mode=Mode.SUBTRACT)
    with BuildSketch(Plane(origin=(70, -1.25, -70), x_dir=(-1, 0, 0), z_dir=(0, 1, 0))) as fillet6_piece_4:
        with BuildLine():
            CenterArc((FILLET6_R, FILLET6_R), FILLET6_R, 180, 90)
            Line((0, FILLET6_R), (0, 0))
            Line((0, 0), (FILLET6_R, 0))
        make_face()
    extrude(amount=141.75, mode=Mode.SUBTRACT)
    with BuildSketch(Plane(origin=(70, -1.25, 70), x_dir=(0, 0, -1), z_dir=(0, 1, 0))) as fillet6_piece_5:
        with BuildLine():
            CenterArc((FILLET6_R, FILLET6_R), FILLET6_R, 180, 90)
            Line((0, FILLET6_R), (0, 0))
            Line((0, 0), (FILLET6_R, 0))
        make_face()
    extrude(amount=127, mode=Mode.SUBTRACT)
    with BuildSketch(Plane(origin=(-70, -1.25, 70), x_dir=(0, 0, -1), z_dir=(0, 1, 0))) as fillet6_piece_6:
        with BuildLine():
            CenterArc((FILLET6_R, -FILLET6_R), FILLET6_R, 90, 90)
            Line((0, -FILLET6_R), (0, 0))
            Line((0, 0), (FILLET6_R, 0))
        make_face()
    extrude(amount=127, mode=Mode.SUBTRACT)

    # Sketch10 → Cut-Extrude7 (cut)
    with BuildSketch(Plane.XY.offset(-60)):
        with Locations((0, 135.25)):
            Rectangle(SKETCH10_W, SKETCH10_H)
    extrude(amount=CUT_EXTRUDE7_DEPTH, mode=Mode.SUBTRACT)

    # Fillet7
    fillet7_edges = [part.edges().sort_by_distance(p)[0] for p in [
        (0, 0, 70),
        (-70, 0, 0),
        (0, 0, -70),
        (70, 0, 0),
        (-69.853553391, 0, -69.853553391),
        (69.853553391, 0, -69.853553391),
        (69.853553391, 0, 69.853553391),
        (-69.853553391, 0, 69.853553391),
    ]]
    fillet(fillet7_edges, radius=FILLET7_R)


solid = part.part
